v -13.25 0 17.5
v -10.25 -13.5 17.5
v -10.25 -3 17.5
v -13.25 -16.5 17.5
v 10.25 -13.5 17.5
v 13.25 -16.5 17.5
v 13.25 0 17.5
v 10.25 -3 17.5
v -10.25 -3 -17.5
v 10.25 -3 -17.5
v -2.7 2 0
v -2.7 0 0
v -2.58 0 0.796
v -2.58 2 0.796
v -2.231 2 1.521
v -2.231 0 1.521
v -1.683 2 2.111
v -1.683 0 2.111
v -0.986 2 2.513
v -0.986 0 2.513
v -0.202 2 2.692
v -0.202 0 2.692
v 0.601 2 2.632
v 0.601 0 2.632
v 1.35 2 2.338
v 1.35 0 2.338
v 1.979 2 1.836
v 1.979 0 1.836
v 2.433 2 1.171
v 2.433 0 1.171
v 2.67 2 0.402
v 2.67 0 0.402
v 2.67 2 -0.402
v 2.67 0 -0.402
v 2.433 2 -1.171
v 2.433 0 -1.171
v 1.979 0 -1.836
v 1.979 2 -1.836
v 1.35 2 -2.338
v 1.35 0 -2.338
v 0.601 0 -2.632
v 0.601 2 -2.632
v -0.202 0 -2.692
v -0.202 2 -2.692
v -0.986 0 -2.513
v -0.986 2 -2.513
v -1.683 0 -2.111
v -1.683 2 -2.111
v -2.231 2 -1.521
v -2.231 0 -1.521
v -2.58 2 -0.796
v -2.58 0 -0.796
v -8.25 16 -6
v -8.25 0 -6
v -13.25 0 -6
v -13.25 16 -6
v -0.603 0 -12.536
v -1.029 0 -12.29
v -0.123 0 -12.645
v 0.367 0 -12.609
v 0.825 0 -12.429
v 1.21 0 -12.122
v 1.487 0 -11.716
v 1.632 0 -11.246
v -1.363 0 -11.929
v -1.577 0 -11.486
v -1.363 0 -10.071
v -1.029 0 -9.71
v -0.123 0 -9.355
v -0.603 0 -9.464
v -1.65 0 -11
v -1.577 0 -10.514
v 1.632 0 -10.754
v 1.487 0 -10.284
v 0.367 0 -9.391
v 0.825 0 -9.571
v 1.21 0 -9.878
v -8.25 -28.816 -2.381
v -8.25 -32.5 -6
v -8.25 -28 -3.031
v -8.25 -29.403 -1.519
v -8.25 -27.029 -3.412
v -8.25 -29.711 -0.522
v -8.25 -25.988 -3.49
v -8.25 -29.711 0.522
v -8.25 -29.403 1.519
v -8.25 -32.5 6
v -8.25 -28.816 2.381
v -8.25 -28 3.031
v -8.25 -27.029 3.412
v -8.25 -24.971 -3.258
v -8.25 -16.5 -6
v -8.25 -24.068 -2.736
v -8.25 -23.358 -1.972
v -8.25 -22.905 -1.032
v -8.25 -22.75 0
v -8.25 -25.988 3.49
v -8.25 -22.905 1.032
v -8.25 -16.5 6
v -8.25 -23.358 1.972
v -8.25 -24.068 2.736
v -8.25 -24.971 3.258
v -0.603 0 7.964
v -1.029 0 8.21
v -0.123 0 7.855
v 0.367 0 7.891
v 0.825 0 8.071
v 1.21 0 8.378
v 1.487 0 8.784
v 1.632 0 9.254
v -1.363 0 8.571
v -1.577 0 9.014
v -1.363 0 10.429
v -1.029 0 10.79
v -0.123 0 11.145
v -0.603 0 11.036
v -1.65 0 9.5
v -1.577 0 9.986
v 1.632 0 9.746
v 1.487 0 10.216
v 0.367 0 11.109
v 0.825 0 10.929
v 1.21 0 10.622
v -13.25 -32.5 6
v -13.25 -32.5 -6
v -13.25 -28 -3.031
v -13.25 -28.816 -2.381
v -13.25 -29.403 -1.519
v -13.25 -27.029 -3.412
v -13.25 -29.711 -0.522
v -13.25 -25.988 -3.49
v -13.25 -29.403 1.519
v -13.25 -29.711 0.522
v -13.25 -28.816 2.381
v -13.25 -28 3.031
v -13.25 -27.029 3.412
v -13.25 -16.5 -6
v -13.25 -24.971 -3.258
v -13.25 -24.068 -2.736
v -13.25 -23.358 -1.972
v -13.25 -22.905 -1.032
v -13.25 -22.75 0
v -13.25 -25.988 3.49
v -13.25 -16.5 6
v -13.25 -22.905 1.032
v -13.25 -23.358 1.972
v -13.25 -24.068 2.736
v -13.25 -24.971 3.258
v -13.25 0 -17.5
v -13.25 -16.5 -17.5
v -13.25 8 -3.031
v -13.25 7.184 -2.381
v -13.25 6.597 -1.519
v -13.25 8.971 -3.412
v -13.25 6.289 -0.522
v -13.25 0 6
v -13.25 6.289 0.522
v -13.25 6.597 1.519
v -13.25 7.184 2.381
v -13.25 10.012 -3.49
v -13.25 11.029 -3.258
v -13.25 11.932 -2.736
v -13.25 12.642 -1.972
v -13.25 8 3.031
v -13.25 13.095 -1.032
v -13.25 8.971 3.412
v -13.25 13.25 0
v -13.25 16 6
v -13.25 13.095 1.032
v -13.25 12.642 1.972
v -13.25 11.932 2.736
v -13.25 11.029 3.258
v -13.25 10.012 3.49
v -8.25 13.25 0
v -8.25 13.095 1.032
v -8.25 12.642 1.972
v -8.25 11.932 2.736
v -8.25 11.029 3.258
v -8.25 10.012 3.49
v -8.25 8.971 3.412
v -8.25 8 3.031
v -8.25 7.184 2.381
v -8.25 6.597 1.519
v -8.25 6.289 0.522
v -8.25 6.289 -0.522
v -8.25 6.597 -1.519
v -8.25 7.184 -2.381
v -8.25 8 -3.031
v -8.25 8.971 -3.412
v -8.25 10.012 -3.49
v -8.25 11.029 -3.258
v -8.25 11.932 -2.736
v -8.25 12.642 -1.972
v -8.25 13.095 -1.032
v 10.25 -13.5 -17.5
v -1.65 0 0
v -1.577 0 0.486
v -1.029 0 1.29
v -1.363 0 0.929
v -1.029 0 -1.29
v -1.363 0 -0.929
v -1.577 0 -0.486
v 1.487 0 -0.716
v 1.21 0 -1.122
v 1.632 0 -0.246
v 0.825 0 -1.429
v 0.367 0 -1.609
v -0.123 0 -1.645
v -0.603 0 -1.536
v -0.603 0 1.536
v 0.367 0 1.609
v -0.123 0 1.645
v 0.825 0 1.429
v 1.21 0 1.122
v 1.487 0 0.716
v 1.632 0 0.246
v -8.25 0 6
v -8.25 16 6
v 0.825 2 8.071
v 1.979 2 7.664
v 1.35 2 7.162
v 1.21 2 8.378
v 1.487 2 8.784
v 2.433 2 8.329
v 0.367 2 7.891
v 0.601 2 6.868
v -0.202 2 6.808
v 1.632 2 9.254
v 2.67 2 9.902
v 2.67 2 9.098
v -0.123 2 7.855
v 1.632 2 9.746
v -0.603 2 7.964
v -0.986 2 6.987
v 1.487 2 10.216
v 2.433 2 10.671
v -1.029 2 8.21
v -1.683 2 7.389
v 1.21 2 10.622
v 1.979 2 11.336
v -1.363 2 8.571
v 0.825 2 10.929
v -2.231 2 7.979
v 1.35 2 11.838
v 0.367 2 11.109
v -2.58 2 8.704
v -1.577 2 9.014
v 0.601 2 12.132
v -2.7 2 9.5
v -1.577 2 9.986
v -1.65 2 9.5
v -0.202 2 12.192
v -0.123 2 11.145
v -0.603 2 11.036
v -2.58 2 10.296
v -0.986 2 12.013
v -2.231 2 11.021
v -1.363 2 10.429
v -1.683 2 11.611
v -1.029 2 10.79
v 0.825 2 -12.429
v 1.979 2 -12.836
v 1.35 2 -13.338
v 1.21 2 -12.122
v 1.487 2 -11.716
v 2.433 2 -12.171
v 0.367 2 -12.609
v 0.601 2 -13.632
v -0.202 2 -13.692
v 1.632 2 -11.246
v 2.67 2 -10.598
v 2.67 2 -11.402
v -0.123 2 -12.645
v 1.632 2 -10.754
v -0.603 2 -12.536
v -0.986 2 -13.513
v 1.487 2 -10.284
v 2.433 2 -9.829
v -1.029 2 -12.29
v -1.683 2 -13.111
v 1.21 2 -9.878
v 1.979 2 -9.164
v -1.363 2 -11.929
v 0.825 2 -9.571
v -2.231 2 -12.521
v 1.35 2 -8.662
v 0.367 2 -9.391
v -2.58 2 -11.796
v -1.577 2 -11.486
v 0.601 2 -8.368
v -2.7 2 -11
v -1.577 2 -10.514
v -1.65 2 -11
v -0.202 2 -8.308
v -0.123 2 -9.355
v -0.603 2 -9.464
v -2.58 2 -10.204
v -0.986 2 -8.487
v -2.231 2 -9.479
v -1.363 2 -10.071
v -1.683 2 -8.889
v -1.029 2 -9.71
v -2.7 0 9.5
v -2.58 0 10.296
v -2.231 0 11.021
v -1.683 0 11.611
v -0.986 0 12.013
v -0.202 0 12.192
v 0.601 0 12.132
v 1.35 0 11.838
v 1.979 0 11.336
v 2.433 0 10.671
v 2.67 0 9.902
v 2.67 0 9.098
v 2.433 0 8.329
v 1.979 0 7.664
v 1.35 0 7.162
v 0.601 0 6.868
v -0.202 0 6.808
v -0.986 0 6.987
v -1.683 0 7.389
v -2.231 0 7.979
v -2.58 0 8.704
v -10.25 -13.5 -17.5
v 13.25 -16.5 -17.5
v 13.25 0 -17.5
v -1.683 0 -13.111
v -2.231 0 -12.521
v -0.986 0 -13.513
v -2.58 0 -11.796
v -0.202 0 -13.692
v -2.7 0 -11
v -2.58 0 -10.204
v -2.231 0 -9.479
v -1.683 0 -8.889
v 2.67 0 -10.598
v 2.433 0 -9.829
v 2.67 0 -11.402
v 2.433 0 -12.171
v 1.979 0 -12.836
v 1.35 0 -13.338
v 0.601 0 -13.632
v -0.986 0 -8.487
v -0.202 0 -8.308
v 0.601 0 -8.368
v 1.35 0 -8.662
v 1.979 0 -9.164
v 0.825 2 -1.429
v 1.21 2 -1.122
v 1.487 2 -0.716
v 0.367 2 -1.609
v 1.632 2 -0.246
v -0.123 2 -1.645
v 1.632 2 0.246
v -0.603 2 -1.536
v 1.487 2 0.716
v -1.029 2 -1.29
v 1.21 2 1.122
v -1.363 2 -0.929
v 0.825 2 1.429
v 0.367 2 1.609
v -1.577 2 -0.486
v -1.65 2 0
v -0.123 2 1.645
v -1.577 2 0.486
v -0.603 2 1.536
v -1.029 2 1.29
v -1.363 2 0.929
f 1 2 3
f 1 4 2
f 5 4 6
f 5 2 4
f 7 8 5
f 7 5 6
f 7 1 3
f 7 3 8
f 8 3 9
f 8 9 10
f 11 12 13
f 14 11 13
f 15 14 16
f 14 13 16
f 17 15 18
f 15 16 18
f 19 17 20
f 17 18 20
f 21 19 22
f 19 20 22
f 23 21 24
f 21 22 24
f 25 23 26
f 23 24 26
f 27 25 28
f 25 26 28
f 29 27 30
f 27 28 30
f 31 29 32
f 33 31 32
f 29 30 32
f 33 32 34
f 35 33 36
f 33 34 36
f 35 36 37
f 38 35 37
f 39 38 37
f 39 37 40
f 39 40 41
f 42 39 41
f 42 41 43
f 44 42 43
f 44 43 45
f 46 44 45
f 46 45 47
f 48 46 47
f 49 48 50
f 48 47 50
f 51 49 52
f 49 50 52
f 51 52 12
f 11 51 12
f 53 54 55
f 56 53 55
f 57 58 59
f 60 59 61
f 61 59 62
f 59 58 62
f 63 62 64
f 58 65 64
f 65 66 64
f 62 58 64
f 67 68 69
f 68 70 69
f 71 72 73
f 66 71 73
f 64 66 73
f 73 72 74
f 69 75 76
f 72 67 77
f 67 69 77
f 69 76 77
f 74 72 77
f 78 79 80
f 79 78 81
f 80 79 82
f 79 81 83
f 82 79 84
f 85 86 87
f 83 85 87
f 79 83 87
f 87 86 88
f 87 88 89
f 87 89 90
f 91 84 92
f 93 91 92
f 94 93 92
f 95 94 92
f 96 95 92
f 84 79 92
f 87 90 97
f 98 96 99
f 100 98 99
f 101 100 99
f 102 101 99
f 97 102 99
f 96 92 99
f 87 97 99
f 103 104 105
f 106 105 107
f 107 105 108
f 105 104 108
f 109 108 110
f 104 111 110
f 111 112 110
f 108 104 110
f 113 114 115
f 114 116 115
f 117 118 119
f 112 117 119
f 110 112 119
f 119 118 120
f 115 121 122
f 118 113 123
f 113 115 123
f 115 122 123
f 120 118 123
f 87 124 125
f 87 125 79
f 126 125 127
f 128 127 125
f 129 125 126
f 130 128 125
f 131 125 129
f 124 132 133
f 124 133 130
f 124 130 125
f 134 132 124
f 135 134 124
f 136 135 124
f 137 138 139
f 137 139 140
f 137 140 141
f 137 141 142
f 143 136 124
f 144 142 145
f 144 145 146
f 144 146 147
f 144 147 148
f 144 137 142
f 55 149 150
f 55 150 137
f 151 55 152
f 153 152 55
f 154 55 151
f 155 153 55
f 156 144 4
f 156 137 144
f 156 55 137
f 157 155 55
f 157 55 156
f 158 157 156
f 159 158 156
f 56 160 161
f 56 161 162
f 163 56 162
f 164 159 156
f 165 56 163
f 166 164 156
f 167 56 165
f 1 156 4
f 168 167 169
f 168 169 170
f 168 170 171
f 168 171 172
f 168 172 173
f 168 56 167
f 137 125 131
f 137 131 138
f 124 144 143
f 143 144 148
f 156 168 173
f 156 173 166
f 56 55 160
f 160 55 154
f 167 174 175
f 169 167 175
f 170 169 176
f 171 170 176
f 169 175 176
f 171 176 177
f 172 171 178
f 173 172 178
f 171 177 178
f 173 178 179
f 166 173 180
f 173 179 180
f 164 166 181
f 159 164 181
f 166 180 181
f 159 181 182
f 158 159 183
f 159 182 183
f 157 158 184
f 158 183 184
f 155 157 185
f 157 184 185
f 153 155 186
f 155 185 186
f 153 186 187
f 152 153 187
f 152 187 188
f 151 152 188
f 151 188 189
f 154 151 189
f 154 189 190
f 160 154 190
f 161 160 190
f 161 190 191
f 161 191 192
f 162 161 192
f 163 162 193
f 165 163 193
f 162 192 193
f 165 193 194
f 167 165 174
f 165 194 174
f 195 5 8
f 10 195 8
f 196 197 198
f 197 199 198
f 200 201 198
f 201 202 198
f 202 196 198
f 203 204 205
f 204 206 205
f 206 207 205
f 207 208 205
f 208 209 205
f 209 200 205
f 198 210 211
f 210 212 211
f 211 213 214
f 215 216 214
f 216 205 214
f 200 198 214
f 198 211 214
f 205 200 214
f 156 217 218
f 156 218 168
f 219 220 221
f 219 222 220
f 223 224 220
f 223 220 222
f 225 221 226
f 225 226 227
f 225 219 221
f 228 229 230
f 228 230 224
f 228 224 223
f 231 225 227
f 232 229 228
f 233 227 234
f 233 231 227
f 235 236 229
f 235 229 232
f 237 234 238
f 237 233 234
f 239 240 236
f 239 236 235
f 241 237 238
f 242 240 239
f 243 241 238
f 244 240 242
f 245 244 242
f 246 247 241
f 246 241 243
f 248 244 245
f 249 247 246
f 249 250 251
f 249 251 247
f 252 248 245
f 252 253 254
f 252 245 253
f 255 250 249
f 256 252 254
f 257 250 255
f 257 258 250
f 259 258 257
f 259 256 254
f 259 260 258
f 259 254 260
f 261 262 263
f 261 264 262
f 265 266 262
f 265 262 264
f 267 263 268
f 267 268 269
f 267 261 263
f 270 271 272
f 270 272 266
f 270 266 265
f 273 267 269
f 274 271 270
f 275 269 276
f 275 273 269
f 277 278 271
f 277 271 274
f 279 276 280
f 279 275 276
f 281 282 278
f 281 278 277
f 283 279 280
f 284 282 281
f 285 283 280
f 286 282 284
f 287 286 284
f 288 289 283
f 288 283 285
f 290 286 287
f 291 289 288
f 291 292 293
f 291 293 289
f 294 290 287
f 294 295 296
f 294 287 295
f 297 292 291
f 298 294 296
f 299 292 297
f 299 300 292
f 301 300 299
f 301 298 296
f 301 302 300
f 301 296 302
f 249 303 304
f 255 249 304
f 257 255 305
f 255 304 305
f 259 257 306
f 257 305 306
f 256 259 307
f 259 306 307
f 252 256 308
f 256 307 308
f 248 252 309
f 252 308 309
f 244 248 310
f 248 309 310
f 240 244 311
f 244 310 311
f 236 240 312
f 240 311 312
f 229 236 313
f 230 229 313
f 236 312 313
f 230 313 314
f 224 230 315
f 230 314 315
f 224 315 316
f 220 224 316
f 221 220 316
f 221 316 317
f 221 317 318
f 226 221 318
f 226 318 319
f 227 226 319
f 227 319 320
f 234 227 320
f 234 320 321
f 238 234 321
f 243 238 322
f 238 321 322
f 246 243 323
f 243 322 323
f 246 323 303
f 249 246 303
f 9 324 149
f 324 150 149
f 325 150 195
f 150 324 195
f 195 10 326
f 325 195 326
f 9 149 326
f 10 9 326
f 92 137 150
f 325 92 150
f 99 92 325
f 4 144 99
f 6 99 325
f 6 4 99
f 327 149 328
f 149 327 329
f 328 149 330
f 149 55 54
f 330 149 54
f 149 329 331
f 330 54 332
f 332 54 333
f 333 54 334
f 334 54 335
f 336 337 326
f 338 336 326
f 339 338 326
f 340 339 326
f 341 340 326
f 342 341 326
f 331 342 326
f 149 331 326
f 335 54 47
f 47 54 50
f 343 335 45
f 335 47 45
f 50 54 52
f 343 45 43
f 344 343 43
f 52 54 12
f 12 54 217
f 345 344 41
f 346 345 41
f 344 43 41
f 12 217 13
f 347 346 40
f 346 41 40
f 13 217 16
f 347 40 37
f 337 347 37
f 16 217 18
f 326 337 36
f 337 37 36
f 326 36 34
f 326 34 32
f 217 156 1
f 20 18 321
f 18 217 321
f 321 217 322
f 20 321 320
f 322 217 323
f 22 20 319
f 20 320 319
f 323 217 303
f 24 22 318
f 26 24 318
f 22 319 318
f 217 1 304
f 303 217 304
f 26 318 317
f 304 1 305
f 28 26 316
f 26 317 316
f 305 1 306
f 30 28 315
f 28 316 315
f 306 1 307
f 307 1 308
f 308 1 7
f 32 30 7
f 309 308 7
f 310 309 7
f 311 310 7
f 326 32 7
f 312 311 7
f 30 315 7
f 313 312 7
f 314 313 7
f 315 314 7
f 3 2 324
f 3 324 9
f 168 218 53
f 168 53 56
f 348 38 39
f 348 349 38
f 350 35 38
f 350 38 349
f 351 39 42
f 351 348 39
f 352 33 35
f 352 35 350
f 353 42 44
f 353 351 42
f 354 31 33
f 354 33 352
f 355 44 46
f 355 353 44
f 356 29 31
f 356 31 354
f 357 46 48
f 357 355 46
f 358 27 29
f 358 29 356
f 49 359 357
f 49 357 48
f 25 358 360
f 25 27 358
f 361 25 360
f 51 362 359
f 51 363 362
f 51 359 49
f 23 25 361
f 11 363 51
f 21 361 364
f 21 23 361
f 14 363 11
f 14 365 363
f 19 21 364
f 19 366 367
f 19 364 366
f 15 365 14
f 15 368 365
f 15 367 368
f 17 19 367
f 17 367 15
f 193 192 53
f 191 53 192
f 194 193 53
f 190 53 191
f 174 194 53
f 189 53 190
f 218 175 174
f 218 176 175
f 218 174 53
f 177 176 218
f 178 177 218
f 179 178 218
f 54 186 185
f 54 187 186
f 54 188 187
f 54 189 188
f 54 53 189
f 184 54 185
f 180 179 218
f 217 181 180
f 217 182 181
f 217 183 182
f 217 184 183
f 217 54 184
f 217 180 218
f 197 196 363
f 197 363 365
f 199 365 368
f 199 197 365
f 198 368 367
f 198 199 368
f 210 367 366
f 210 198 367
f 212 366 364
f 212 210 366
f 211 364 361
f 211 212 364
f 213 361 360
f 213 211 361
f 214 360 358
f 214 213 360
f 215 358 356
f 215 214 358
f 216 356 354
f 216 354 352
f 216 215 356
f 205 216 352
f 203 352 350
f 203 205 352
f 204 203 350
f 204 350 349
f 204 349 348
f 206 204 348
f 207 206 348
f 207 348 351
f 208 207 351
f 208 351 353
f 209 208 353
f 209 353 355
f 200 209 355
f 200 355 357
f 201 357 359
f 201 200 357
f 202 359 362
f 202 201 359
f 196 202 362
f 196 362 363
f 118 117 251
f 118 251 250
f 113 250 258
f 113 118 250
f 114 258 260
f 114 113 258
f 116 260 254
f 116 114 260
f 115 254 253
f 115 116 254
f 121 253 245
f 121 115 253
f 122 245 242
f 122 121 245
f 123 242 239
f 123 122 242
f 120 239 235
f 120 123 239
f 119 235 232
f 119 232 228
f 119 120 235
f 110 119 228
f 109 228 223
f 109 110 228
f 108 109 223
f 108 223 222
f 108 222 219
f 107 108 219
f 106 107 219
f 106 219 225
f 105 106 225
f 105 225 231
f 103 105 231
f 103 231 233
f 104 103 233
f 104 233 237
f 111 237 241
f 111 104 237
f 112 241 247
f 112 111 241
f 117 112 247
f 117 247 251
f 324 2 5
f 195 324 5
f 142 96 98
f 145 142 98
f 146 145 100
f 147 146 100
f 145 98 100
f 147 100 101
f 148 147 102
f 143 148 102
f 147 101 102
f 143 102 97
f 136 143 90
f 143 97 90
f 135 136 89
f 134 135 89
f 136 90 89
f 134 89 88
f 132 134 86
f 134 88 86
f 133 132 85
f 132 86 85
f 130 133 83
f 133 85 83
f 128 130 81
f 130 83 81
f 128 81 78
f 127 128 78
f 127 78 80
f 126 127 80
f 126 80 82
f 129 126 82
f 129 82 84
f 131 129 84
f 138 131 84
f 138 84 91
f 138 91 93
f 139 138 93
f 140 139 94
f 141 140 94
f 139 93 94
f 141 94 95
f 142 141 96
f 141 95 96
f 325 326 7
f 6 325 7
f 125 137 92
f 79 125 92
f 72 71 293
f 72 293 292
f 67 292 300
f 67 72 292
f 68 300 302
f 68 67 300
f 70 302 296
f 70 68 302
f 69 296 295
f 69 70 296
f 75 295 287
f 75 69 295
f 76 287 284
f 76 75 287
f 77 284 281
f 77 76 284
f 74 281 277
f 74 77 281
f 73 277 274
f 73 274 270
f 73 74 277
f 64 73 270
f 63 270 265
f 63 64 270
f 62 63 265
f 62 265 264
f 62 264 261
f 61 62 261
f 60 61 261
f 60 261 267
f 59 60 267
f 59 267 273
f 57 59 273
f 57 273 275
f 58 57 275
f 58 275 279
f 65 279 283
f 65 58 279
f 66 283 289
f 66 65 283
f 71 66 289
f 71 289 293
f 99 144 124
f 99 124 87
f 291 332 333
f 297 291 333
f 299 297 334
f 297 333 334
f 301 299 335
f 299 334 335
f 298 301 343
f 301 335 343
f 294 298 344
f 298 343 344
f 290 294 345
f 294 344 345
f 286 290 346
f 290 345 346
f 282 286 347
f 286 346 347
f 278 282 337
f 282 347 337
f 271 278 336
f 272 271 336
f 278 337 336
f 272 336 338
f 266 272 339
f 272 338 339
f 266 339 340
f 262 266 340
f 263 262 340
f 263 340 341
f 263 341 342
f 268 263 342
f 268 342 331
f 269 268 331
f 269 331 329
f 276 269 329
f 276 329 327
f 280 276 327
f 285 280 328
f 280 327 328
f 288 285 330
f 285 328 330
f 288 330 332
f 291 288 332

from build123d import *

# Parameters (mm, degrees)
F0_W      = 26.5
F0_H      = 35
F1_DEPTH  = 16.5
F2_W      = 20.5
F2_H      = 10.5
F3_DEPTH  = 35
F4_R      = 2.7
F4_R_2    = 1.65
F5_DEPTH  = 2
F6_W      = 5
F6_H      = 12
F7_DEPTH  = 16
F8_W      = 5
F8_H      = 12
F9_DEPTH  = 16
F10_R     = 3.5
F11_DEPTH = 5
F12_R     = 3.5
F13_DEPTH = 5


with BuildPart() as f1:
    # F0 (on Front) → F1 (new body)
    with BuildSketch(Plane.XZ):
        Rectangle(F0_W, F0_H)
    extrude(amount=F1_DEPTH)

    # F2 (on face) → F3 (cut)
    with BuildSketch(Plane.XY.offset(17.5)):
        with Locations((0, -8.25)):
            Rectangle(F2_W, F2_H)
    extrude(amount=-F3_DEPTH, mode=Mode.SUBTRACT)

    # F4 (on face) → F5 (join)
    with BuildSketch(Plane(origin=(0, 0, 0), x_dir=(-1, 0, 0), z_dir=(0, 1, 0))):
        Circle(F4_R)
        Circle(F4_R_2, mode=Mode.SUBTRACT)
        with Locations((0, 9.5)):
            Circle(F4_R)
        with Locations((0, 9.5)):
            Circle(F4_R_2, mode=Mode.SUBTRACT)
        with Locations((0, -11)):
            Circle(F4_R)
        with Locations((0, -11)):
            Circle(F4_R_2, mode=Mode.SUBTRACT)
    extrude(amount=F5_DEPTH)

    # F6 (on face) → F7 (join)
    with BuildSketch(Plane.XZ.offset(16.5)):
        with Locations((-10.75, 0)):
            Rectangle(F6_W, F6_H)
    extrude(amount=F7_DEPTH)

    # F8 (on face) → F9 (join)
    with BuildSketch(Plane(origin=(0, 0, 0), x_dir=(-1, 0, 0), z_dir=(0, 1, 0))):
        with Locations((10.75, 0)):
            Rectangle(F8_W, F8_H)
    extrude(amount=F9_DEPTH)

    # F10 (on face) → F11 (cut)
    with BuildSketch(Plane.YZ.offset(-8.25)):
        with Locations((9.75, 0)):
            Circle(F10_R)
    extrude(amount=-F11_DEPTH, mode=Mode.SUBTRACT)

    # F12 (on face) → F13 (cut)
    with BuildSketch(Plane.YZ.offset(-8.25)):
        with Locations((-26.25, 0)):
            Circle(F12_R)
    extrude(amount=-F13_DEPTH, mode=Mode.SUBTRACT)


solid = f1.part
